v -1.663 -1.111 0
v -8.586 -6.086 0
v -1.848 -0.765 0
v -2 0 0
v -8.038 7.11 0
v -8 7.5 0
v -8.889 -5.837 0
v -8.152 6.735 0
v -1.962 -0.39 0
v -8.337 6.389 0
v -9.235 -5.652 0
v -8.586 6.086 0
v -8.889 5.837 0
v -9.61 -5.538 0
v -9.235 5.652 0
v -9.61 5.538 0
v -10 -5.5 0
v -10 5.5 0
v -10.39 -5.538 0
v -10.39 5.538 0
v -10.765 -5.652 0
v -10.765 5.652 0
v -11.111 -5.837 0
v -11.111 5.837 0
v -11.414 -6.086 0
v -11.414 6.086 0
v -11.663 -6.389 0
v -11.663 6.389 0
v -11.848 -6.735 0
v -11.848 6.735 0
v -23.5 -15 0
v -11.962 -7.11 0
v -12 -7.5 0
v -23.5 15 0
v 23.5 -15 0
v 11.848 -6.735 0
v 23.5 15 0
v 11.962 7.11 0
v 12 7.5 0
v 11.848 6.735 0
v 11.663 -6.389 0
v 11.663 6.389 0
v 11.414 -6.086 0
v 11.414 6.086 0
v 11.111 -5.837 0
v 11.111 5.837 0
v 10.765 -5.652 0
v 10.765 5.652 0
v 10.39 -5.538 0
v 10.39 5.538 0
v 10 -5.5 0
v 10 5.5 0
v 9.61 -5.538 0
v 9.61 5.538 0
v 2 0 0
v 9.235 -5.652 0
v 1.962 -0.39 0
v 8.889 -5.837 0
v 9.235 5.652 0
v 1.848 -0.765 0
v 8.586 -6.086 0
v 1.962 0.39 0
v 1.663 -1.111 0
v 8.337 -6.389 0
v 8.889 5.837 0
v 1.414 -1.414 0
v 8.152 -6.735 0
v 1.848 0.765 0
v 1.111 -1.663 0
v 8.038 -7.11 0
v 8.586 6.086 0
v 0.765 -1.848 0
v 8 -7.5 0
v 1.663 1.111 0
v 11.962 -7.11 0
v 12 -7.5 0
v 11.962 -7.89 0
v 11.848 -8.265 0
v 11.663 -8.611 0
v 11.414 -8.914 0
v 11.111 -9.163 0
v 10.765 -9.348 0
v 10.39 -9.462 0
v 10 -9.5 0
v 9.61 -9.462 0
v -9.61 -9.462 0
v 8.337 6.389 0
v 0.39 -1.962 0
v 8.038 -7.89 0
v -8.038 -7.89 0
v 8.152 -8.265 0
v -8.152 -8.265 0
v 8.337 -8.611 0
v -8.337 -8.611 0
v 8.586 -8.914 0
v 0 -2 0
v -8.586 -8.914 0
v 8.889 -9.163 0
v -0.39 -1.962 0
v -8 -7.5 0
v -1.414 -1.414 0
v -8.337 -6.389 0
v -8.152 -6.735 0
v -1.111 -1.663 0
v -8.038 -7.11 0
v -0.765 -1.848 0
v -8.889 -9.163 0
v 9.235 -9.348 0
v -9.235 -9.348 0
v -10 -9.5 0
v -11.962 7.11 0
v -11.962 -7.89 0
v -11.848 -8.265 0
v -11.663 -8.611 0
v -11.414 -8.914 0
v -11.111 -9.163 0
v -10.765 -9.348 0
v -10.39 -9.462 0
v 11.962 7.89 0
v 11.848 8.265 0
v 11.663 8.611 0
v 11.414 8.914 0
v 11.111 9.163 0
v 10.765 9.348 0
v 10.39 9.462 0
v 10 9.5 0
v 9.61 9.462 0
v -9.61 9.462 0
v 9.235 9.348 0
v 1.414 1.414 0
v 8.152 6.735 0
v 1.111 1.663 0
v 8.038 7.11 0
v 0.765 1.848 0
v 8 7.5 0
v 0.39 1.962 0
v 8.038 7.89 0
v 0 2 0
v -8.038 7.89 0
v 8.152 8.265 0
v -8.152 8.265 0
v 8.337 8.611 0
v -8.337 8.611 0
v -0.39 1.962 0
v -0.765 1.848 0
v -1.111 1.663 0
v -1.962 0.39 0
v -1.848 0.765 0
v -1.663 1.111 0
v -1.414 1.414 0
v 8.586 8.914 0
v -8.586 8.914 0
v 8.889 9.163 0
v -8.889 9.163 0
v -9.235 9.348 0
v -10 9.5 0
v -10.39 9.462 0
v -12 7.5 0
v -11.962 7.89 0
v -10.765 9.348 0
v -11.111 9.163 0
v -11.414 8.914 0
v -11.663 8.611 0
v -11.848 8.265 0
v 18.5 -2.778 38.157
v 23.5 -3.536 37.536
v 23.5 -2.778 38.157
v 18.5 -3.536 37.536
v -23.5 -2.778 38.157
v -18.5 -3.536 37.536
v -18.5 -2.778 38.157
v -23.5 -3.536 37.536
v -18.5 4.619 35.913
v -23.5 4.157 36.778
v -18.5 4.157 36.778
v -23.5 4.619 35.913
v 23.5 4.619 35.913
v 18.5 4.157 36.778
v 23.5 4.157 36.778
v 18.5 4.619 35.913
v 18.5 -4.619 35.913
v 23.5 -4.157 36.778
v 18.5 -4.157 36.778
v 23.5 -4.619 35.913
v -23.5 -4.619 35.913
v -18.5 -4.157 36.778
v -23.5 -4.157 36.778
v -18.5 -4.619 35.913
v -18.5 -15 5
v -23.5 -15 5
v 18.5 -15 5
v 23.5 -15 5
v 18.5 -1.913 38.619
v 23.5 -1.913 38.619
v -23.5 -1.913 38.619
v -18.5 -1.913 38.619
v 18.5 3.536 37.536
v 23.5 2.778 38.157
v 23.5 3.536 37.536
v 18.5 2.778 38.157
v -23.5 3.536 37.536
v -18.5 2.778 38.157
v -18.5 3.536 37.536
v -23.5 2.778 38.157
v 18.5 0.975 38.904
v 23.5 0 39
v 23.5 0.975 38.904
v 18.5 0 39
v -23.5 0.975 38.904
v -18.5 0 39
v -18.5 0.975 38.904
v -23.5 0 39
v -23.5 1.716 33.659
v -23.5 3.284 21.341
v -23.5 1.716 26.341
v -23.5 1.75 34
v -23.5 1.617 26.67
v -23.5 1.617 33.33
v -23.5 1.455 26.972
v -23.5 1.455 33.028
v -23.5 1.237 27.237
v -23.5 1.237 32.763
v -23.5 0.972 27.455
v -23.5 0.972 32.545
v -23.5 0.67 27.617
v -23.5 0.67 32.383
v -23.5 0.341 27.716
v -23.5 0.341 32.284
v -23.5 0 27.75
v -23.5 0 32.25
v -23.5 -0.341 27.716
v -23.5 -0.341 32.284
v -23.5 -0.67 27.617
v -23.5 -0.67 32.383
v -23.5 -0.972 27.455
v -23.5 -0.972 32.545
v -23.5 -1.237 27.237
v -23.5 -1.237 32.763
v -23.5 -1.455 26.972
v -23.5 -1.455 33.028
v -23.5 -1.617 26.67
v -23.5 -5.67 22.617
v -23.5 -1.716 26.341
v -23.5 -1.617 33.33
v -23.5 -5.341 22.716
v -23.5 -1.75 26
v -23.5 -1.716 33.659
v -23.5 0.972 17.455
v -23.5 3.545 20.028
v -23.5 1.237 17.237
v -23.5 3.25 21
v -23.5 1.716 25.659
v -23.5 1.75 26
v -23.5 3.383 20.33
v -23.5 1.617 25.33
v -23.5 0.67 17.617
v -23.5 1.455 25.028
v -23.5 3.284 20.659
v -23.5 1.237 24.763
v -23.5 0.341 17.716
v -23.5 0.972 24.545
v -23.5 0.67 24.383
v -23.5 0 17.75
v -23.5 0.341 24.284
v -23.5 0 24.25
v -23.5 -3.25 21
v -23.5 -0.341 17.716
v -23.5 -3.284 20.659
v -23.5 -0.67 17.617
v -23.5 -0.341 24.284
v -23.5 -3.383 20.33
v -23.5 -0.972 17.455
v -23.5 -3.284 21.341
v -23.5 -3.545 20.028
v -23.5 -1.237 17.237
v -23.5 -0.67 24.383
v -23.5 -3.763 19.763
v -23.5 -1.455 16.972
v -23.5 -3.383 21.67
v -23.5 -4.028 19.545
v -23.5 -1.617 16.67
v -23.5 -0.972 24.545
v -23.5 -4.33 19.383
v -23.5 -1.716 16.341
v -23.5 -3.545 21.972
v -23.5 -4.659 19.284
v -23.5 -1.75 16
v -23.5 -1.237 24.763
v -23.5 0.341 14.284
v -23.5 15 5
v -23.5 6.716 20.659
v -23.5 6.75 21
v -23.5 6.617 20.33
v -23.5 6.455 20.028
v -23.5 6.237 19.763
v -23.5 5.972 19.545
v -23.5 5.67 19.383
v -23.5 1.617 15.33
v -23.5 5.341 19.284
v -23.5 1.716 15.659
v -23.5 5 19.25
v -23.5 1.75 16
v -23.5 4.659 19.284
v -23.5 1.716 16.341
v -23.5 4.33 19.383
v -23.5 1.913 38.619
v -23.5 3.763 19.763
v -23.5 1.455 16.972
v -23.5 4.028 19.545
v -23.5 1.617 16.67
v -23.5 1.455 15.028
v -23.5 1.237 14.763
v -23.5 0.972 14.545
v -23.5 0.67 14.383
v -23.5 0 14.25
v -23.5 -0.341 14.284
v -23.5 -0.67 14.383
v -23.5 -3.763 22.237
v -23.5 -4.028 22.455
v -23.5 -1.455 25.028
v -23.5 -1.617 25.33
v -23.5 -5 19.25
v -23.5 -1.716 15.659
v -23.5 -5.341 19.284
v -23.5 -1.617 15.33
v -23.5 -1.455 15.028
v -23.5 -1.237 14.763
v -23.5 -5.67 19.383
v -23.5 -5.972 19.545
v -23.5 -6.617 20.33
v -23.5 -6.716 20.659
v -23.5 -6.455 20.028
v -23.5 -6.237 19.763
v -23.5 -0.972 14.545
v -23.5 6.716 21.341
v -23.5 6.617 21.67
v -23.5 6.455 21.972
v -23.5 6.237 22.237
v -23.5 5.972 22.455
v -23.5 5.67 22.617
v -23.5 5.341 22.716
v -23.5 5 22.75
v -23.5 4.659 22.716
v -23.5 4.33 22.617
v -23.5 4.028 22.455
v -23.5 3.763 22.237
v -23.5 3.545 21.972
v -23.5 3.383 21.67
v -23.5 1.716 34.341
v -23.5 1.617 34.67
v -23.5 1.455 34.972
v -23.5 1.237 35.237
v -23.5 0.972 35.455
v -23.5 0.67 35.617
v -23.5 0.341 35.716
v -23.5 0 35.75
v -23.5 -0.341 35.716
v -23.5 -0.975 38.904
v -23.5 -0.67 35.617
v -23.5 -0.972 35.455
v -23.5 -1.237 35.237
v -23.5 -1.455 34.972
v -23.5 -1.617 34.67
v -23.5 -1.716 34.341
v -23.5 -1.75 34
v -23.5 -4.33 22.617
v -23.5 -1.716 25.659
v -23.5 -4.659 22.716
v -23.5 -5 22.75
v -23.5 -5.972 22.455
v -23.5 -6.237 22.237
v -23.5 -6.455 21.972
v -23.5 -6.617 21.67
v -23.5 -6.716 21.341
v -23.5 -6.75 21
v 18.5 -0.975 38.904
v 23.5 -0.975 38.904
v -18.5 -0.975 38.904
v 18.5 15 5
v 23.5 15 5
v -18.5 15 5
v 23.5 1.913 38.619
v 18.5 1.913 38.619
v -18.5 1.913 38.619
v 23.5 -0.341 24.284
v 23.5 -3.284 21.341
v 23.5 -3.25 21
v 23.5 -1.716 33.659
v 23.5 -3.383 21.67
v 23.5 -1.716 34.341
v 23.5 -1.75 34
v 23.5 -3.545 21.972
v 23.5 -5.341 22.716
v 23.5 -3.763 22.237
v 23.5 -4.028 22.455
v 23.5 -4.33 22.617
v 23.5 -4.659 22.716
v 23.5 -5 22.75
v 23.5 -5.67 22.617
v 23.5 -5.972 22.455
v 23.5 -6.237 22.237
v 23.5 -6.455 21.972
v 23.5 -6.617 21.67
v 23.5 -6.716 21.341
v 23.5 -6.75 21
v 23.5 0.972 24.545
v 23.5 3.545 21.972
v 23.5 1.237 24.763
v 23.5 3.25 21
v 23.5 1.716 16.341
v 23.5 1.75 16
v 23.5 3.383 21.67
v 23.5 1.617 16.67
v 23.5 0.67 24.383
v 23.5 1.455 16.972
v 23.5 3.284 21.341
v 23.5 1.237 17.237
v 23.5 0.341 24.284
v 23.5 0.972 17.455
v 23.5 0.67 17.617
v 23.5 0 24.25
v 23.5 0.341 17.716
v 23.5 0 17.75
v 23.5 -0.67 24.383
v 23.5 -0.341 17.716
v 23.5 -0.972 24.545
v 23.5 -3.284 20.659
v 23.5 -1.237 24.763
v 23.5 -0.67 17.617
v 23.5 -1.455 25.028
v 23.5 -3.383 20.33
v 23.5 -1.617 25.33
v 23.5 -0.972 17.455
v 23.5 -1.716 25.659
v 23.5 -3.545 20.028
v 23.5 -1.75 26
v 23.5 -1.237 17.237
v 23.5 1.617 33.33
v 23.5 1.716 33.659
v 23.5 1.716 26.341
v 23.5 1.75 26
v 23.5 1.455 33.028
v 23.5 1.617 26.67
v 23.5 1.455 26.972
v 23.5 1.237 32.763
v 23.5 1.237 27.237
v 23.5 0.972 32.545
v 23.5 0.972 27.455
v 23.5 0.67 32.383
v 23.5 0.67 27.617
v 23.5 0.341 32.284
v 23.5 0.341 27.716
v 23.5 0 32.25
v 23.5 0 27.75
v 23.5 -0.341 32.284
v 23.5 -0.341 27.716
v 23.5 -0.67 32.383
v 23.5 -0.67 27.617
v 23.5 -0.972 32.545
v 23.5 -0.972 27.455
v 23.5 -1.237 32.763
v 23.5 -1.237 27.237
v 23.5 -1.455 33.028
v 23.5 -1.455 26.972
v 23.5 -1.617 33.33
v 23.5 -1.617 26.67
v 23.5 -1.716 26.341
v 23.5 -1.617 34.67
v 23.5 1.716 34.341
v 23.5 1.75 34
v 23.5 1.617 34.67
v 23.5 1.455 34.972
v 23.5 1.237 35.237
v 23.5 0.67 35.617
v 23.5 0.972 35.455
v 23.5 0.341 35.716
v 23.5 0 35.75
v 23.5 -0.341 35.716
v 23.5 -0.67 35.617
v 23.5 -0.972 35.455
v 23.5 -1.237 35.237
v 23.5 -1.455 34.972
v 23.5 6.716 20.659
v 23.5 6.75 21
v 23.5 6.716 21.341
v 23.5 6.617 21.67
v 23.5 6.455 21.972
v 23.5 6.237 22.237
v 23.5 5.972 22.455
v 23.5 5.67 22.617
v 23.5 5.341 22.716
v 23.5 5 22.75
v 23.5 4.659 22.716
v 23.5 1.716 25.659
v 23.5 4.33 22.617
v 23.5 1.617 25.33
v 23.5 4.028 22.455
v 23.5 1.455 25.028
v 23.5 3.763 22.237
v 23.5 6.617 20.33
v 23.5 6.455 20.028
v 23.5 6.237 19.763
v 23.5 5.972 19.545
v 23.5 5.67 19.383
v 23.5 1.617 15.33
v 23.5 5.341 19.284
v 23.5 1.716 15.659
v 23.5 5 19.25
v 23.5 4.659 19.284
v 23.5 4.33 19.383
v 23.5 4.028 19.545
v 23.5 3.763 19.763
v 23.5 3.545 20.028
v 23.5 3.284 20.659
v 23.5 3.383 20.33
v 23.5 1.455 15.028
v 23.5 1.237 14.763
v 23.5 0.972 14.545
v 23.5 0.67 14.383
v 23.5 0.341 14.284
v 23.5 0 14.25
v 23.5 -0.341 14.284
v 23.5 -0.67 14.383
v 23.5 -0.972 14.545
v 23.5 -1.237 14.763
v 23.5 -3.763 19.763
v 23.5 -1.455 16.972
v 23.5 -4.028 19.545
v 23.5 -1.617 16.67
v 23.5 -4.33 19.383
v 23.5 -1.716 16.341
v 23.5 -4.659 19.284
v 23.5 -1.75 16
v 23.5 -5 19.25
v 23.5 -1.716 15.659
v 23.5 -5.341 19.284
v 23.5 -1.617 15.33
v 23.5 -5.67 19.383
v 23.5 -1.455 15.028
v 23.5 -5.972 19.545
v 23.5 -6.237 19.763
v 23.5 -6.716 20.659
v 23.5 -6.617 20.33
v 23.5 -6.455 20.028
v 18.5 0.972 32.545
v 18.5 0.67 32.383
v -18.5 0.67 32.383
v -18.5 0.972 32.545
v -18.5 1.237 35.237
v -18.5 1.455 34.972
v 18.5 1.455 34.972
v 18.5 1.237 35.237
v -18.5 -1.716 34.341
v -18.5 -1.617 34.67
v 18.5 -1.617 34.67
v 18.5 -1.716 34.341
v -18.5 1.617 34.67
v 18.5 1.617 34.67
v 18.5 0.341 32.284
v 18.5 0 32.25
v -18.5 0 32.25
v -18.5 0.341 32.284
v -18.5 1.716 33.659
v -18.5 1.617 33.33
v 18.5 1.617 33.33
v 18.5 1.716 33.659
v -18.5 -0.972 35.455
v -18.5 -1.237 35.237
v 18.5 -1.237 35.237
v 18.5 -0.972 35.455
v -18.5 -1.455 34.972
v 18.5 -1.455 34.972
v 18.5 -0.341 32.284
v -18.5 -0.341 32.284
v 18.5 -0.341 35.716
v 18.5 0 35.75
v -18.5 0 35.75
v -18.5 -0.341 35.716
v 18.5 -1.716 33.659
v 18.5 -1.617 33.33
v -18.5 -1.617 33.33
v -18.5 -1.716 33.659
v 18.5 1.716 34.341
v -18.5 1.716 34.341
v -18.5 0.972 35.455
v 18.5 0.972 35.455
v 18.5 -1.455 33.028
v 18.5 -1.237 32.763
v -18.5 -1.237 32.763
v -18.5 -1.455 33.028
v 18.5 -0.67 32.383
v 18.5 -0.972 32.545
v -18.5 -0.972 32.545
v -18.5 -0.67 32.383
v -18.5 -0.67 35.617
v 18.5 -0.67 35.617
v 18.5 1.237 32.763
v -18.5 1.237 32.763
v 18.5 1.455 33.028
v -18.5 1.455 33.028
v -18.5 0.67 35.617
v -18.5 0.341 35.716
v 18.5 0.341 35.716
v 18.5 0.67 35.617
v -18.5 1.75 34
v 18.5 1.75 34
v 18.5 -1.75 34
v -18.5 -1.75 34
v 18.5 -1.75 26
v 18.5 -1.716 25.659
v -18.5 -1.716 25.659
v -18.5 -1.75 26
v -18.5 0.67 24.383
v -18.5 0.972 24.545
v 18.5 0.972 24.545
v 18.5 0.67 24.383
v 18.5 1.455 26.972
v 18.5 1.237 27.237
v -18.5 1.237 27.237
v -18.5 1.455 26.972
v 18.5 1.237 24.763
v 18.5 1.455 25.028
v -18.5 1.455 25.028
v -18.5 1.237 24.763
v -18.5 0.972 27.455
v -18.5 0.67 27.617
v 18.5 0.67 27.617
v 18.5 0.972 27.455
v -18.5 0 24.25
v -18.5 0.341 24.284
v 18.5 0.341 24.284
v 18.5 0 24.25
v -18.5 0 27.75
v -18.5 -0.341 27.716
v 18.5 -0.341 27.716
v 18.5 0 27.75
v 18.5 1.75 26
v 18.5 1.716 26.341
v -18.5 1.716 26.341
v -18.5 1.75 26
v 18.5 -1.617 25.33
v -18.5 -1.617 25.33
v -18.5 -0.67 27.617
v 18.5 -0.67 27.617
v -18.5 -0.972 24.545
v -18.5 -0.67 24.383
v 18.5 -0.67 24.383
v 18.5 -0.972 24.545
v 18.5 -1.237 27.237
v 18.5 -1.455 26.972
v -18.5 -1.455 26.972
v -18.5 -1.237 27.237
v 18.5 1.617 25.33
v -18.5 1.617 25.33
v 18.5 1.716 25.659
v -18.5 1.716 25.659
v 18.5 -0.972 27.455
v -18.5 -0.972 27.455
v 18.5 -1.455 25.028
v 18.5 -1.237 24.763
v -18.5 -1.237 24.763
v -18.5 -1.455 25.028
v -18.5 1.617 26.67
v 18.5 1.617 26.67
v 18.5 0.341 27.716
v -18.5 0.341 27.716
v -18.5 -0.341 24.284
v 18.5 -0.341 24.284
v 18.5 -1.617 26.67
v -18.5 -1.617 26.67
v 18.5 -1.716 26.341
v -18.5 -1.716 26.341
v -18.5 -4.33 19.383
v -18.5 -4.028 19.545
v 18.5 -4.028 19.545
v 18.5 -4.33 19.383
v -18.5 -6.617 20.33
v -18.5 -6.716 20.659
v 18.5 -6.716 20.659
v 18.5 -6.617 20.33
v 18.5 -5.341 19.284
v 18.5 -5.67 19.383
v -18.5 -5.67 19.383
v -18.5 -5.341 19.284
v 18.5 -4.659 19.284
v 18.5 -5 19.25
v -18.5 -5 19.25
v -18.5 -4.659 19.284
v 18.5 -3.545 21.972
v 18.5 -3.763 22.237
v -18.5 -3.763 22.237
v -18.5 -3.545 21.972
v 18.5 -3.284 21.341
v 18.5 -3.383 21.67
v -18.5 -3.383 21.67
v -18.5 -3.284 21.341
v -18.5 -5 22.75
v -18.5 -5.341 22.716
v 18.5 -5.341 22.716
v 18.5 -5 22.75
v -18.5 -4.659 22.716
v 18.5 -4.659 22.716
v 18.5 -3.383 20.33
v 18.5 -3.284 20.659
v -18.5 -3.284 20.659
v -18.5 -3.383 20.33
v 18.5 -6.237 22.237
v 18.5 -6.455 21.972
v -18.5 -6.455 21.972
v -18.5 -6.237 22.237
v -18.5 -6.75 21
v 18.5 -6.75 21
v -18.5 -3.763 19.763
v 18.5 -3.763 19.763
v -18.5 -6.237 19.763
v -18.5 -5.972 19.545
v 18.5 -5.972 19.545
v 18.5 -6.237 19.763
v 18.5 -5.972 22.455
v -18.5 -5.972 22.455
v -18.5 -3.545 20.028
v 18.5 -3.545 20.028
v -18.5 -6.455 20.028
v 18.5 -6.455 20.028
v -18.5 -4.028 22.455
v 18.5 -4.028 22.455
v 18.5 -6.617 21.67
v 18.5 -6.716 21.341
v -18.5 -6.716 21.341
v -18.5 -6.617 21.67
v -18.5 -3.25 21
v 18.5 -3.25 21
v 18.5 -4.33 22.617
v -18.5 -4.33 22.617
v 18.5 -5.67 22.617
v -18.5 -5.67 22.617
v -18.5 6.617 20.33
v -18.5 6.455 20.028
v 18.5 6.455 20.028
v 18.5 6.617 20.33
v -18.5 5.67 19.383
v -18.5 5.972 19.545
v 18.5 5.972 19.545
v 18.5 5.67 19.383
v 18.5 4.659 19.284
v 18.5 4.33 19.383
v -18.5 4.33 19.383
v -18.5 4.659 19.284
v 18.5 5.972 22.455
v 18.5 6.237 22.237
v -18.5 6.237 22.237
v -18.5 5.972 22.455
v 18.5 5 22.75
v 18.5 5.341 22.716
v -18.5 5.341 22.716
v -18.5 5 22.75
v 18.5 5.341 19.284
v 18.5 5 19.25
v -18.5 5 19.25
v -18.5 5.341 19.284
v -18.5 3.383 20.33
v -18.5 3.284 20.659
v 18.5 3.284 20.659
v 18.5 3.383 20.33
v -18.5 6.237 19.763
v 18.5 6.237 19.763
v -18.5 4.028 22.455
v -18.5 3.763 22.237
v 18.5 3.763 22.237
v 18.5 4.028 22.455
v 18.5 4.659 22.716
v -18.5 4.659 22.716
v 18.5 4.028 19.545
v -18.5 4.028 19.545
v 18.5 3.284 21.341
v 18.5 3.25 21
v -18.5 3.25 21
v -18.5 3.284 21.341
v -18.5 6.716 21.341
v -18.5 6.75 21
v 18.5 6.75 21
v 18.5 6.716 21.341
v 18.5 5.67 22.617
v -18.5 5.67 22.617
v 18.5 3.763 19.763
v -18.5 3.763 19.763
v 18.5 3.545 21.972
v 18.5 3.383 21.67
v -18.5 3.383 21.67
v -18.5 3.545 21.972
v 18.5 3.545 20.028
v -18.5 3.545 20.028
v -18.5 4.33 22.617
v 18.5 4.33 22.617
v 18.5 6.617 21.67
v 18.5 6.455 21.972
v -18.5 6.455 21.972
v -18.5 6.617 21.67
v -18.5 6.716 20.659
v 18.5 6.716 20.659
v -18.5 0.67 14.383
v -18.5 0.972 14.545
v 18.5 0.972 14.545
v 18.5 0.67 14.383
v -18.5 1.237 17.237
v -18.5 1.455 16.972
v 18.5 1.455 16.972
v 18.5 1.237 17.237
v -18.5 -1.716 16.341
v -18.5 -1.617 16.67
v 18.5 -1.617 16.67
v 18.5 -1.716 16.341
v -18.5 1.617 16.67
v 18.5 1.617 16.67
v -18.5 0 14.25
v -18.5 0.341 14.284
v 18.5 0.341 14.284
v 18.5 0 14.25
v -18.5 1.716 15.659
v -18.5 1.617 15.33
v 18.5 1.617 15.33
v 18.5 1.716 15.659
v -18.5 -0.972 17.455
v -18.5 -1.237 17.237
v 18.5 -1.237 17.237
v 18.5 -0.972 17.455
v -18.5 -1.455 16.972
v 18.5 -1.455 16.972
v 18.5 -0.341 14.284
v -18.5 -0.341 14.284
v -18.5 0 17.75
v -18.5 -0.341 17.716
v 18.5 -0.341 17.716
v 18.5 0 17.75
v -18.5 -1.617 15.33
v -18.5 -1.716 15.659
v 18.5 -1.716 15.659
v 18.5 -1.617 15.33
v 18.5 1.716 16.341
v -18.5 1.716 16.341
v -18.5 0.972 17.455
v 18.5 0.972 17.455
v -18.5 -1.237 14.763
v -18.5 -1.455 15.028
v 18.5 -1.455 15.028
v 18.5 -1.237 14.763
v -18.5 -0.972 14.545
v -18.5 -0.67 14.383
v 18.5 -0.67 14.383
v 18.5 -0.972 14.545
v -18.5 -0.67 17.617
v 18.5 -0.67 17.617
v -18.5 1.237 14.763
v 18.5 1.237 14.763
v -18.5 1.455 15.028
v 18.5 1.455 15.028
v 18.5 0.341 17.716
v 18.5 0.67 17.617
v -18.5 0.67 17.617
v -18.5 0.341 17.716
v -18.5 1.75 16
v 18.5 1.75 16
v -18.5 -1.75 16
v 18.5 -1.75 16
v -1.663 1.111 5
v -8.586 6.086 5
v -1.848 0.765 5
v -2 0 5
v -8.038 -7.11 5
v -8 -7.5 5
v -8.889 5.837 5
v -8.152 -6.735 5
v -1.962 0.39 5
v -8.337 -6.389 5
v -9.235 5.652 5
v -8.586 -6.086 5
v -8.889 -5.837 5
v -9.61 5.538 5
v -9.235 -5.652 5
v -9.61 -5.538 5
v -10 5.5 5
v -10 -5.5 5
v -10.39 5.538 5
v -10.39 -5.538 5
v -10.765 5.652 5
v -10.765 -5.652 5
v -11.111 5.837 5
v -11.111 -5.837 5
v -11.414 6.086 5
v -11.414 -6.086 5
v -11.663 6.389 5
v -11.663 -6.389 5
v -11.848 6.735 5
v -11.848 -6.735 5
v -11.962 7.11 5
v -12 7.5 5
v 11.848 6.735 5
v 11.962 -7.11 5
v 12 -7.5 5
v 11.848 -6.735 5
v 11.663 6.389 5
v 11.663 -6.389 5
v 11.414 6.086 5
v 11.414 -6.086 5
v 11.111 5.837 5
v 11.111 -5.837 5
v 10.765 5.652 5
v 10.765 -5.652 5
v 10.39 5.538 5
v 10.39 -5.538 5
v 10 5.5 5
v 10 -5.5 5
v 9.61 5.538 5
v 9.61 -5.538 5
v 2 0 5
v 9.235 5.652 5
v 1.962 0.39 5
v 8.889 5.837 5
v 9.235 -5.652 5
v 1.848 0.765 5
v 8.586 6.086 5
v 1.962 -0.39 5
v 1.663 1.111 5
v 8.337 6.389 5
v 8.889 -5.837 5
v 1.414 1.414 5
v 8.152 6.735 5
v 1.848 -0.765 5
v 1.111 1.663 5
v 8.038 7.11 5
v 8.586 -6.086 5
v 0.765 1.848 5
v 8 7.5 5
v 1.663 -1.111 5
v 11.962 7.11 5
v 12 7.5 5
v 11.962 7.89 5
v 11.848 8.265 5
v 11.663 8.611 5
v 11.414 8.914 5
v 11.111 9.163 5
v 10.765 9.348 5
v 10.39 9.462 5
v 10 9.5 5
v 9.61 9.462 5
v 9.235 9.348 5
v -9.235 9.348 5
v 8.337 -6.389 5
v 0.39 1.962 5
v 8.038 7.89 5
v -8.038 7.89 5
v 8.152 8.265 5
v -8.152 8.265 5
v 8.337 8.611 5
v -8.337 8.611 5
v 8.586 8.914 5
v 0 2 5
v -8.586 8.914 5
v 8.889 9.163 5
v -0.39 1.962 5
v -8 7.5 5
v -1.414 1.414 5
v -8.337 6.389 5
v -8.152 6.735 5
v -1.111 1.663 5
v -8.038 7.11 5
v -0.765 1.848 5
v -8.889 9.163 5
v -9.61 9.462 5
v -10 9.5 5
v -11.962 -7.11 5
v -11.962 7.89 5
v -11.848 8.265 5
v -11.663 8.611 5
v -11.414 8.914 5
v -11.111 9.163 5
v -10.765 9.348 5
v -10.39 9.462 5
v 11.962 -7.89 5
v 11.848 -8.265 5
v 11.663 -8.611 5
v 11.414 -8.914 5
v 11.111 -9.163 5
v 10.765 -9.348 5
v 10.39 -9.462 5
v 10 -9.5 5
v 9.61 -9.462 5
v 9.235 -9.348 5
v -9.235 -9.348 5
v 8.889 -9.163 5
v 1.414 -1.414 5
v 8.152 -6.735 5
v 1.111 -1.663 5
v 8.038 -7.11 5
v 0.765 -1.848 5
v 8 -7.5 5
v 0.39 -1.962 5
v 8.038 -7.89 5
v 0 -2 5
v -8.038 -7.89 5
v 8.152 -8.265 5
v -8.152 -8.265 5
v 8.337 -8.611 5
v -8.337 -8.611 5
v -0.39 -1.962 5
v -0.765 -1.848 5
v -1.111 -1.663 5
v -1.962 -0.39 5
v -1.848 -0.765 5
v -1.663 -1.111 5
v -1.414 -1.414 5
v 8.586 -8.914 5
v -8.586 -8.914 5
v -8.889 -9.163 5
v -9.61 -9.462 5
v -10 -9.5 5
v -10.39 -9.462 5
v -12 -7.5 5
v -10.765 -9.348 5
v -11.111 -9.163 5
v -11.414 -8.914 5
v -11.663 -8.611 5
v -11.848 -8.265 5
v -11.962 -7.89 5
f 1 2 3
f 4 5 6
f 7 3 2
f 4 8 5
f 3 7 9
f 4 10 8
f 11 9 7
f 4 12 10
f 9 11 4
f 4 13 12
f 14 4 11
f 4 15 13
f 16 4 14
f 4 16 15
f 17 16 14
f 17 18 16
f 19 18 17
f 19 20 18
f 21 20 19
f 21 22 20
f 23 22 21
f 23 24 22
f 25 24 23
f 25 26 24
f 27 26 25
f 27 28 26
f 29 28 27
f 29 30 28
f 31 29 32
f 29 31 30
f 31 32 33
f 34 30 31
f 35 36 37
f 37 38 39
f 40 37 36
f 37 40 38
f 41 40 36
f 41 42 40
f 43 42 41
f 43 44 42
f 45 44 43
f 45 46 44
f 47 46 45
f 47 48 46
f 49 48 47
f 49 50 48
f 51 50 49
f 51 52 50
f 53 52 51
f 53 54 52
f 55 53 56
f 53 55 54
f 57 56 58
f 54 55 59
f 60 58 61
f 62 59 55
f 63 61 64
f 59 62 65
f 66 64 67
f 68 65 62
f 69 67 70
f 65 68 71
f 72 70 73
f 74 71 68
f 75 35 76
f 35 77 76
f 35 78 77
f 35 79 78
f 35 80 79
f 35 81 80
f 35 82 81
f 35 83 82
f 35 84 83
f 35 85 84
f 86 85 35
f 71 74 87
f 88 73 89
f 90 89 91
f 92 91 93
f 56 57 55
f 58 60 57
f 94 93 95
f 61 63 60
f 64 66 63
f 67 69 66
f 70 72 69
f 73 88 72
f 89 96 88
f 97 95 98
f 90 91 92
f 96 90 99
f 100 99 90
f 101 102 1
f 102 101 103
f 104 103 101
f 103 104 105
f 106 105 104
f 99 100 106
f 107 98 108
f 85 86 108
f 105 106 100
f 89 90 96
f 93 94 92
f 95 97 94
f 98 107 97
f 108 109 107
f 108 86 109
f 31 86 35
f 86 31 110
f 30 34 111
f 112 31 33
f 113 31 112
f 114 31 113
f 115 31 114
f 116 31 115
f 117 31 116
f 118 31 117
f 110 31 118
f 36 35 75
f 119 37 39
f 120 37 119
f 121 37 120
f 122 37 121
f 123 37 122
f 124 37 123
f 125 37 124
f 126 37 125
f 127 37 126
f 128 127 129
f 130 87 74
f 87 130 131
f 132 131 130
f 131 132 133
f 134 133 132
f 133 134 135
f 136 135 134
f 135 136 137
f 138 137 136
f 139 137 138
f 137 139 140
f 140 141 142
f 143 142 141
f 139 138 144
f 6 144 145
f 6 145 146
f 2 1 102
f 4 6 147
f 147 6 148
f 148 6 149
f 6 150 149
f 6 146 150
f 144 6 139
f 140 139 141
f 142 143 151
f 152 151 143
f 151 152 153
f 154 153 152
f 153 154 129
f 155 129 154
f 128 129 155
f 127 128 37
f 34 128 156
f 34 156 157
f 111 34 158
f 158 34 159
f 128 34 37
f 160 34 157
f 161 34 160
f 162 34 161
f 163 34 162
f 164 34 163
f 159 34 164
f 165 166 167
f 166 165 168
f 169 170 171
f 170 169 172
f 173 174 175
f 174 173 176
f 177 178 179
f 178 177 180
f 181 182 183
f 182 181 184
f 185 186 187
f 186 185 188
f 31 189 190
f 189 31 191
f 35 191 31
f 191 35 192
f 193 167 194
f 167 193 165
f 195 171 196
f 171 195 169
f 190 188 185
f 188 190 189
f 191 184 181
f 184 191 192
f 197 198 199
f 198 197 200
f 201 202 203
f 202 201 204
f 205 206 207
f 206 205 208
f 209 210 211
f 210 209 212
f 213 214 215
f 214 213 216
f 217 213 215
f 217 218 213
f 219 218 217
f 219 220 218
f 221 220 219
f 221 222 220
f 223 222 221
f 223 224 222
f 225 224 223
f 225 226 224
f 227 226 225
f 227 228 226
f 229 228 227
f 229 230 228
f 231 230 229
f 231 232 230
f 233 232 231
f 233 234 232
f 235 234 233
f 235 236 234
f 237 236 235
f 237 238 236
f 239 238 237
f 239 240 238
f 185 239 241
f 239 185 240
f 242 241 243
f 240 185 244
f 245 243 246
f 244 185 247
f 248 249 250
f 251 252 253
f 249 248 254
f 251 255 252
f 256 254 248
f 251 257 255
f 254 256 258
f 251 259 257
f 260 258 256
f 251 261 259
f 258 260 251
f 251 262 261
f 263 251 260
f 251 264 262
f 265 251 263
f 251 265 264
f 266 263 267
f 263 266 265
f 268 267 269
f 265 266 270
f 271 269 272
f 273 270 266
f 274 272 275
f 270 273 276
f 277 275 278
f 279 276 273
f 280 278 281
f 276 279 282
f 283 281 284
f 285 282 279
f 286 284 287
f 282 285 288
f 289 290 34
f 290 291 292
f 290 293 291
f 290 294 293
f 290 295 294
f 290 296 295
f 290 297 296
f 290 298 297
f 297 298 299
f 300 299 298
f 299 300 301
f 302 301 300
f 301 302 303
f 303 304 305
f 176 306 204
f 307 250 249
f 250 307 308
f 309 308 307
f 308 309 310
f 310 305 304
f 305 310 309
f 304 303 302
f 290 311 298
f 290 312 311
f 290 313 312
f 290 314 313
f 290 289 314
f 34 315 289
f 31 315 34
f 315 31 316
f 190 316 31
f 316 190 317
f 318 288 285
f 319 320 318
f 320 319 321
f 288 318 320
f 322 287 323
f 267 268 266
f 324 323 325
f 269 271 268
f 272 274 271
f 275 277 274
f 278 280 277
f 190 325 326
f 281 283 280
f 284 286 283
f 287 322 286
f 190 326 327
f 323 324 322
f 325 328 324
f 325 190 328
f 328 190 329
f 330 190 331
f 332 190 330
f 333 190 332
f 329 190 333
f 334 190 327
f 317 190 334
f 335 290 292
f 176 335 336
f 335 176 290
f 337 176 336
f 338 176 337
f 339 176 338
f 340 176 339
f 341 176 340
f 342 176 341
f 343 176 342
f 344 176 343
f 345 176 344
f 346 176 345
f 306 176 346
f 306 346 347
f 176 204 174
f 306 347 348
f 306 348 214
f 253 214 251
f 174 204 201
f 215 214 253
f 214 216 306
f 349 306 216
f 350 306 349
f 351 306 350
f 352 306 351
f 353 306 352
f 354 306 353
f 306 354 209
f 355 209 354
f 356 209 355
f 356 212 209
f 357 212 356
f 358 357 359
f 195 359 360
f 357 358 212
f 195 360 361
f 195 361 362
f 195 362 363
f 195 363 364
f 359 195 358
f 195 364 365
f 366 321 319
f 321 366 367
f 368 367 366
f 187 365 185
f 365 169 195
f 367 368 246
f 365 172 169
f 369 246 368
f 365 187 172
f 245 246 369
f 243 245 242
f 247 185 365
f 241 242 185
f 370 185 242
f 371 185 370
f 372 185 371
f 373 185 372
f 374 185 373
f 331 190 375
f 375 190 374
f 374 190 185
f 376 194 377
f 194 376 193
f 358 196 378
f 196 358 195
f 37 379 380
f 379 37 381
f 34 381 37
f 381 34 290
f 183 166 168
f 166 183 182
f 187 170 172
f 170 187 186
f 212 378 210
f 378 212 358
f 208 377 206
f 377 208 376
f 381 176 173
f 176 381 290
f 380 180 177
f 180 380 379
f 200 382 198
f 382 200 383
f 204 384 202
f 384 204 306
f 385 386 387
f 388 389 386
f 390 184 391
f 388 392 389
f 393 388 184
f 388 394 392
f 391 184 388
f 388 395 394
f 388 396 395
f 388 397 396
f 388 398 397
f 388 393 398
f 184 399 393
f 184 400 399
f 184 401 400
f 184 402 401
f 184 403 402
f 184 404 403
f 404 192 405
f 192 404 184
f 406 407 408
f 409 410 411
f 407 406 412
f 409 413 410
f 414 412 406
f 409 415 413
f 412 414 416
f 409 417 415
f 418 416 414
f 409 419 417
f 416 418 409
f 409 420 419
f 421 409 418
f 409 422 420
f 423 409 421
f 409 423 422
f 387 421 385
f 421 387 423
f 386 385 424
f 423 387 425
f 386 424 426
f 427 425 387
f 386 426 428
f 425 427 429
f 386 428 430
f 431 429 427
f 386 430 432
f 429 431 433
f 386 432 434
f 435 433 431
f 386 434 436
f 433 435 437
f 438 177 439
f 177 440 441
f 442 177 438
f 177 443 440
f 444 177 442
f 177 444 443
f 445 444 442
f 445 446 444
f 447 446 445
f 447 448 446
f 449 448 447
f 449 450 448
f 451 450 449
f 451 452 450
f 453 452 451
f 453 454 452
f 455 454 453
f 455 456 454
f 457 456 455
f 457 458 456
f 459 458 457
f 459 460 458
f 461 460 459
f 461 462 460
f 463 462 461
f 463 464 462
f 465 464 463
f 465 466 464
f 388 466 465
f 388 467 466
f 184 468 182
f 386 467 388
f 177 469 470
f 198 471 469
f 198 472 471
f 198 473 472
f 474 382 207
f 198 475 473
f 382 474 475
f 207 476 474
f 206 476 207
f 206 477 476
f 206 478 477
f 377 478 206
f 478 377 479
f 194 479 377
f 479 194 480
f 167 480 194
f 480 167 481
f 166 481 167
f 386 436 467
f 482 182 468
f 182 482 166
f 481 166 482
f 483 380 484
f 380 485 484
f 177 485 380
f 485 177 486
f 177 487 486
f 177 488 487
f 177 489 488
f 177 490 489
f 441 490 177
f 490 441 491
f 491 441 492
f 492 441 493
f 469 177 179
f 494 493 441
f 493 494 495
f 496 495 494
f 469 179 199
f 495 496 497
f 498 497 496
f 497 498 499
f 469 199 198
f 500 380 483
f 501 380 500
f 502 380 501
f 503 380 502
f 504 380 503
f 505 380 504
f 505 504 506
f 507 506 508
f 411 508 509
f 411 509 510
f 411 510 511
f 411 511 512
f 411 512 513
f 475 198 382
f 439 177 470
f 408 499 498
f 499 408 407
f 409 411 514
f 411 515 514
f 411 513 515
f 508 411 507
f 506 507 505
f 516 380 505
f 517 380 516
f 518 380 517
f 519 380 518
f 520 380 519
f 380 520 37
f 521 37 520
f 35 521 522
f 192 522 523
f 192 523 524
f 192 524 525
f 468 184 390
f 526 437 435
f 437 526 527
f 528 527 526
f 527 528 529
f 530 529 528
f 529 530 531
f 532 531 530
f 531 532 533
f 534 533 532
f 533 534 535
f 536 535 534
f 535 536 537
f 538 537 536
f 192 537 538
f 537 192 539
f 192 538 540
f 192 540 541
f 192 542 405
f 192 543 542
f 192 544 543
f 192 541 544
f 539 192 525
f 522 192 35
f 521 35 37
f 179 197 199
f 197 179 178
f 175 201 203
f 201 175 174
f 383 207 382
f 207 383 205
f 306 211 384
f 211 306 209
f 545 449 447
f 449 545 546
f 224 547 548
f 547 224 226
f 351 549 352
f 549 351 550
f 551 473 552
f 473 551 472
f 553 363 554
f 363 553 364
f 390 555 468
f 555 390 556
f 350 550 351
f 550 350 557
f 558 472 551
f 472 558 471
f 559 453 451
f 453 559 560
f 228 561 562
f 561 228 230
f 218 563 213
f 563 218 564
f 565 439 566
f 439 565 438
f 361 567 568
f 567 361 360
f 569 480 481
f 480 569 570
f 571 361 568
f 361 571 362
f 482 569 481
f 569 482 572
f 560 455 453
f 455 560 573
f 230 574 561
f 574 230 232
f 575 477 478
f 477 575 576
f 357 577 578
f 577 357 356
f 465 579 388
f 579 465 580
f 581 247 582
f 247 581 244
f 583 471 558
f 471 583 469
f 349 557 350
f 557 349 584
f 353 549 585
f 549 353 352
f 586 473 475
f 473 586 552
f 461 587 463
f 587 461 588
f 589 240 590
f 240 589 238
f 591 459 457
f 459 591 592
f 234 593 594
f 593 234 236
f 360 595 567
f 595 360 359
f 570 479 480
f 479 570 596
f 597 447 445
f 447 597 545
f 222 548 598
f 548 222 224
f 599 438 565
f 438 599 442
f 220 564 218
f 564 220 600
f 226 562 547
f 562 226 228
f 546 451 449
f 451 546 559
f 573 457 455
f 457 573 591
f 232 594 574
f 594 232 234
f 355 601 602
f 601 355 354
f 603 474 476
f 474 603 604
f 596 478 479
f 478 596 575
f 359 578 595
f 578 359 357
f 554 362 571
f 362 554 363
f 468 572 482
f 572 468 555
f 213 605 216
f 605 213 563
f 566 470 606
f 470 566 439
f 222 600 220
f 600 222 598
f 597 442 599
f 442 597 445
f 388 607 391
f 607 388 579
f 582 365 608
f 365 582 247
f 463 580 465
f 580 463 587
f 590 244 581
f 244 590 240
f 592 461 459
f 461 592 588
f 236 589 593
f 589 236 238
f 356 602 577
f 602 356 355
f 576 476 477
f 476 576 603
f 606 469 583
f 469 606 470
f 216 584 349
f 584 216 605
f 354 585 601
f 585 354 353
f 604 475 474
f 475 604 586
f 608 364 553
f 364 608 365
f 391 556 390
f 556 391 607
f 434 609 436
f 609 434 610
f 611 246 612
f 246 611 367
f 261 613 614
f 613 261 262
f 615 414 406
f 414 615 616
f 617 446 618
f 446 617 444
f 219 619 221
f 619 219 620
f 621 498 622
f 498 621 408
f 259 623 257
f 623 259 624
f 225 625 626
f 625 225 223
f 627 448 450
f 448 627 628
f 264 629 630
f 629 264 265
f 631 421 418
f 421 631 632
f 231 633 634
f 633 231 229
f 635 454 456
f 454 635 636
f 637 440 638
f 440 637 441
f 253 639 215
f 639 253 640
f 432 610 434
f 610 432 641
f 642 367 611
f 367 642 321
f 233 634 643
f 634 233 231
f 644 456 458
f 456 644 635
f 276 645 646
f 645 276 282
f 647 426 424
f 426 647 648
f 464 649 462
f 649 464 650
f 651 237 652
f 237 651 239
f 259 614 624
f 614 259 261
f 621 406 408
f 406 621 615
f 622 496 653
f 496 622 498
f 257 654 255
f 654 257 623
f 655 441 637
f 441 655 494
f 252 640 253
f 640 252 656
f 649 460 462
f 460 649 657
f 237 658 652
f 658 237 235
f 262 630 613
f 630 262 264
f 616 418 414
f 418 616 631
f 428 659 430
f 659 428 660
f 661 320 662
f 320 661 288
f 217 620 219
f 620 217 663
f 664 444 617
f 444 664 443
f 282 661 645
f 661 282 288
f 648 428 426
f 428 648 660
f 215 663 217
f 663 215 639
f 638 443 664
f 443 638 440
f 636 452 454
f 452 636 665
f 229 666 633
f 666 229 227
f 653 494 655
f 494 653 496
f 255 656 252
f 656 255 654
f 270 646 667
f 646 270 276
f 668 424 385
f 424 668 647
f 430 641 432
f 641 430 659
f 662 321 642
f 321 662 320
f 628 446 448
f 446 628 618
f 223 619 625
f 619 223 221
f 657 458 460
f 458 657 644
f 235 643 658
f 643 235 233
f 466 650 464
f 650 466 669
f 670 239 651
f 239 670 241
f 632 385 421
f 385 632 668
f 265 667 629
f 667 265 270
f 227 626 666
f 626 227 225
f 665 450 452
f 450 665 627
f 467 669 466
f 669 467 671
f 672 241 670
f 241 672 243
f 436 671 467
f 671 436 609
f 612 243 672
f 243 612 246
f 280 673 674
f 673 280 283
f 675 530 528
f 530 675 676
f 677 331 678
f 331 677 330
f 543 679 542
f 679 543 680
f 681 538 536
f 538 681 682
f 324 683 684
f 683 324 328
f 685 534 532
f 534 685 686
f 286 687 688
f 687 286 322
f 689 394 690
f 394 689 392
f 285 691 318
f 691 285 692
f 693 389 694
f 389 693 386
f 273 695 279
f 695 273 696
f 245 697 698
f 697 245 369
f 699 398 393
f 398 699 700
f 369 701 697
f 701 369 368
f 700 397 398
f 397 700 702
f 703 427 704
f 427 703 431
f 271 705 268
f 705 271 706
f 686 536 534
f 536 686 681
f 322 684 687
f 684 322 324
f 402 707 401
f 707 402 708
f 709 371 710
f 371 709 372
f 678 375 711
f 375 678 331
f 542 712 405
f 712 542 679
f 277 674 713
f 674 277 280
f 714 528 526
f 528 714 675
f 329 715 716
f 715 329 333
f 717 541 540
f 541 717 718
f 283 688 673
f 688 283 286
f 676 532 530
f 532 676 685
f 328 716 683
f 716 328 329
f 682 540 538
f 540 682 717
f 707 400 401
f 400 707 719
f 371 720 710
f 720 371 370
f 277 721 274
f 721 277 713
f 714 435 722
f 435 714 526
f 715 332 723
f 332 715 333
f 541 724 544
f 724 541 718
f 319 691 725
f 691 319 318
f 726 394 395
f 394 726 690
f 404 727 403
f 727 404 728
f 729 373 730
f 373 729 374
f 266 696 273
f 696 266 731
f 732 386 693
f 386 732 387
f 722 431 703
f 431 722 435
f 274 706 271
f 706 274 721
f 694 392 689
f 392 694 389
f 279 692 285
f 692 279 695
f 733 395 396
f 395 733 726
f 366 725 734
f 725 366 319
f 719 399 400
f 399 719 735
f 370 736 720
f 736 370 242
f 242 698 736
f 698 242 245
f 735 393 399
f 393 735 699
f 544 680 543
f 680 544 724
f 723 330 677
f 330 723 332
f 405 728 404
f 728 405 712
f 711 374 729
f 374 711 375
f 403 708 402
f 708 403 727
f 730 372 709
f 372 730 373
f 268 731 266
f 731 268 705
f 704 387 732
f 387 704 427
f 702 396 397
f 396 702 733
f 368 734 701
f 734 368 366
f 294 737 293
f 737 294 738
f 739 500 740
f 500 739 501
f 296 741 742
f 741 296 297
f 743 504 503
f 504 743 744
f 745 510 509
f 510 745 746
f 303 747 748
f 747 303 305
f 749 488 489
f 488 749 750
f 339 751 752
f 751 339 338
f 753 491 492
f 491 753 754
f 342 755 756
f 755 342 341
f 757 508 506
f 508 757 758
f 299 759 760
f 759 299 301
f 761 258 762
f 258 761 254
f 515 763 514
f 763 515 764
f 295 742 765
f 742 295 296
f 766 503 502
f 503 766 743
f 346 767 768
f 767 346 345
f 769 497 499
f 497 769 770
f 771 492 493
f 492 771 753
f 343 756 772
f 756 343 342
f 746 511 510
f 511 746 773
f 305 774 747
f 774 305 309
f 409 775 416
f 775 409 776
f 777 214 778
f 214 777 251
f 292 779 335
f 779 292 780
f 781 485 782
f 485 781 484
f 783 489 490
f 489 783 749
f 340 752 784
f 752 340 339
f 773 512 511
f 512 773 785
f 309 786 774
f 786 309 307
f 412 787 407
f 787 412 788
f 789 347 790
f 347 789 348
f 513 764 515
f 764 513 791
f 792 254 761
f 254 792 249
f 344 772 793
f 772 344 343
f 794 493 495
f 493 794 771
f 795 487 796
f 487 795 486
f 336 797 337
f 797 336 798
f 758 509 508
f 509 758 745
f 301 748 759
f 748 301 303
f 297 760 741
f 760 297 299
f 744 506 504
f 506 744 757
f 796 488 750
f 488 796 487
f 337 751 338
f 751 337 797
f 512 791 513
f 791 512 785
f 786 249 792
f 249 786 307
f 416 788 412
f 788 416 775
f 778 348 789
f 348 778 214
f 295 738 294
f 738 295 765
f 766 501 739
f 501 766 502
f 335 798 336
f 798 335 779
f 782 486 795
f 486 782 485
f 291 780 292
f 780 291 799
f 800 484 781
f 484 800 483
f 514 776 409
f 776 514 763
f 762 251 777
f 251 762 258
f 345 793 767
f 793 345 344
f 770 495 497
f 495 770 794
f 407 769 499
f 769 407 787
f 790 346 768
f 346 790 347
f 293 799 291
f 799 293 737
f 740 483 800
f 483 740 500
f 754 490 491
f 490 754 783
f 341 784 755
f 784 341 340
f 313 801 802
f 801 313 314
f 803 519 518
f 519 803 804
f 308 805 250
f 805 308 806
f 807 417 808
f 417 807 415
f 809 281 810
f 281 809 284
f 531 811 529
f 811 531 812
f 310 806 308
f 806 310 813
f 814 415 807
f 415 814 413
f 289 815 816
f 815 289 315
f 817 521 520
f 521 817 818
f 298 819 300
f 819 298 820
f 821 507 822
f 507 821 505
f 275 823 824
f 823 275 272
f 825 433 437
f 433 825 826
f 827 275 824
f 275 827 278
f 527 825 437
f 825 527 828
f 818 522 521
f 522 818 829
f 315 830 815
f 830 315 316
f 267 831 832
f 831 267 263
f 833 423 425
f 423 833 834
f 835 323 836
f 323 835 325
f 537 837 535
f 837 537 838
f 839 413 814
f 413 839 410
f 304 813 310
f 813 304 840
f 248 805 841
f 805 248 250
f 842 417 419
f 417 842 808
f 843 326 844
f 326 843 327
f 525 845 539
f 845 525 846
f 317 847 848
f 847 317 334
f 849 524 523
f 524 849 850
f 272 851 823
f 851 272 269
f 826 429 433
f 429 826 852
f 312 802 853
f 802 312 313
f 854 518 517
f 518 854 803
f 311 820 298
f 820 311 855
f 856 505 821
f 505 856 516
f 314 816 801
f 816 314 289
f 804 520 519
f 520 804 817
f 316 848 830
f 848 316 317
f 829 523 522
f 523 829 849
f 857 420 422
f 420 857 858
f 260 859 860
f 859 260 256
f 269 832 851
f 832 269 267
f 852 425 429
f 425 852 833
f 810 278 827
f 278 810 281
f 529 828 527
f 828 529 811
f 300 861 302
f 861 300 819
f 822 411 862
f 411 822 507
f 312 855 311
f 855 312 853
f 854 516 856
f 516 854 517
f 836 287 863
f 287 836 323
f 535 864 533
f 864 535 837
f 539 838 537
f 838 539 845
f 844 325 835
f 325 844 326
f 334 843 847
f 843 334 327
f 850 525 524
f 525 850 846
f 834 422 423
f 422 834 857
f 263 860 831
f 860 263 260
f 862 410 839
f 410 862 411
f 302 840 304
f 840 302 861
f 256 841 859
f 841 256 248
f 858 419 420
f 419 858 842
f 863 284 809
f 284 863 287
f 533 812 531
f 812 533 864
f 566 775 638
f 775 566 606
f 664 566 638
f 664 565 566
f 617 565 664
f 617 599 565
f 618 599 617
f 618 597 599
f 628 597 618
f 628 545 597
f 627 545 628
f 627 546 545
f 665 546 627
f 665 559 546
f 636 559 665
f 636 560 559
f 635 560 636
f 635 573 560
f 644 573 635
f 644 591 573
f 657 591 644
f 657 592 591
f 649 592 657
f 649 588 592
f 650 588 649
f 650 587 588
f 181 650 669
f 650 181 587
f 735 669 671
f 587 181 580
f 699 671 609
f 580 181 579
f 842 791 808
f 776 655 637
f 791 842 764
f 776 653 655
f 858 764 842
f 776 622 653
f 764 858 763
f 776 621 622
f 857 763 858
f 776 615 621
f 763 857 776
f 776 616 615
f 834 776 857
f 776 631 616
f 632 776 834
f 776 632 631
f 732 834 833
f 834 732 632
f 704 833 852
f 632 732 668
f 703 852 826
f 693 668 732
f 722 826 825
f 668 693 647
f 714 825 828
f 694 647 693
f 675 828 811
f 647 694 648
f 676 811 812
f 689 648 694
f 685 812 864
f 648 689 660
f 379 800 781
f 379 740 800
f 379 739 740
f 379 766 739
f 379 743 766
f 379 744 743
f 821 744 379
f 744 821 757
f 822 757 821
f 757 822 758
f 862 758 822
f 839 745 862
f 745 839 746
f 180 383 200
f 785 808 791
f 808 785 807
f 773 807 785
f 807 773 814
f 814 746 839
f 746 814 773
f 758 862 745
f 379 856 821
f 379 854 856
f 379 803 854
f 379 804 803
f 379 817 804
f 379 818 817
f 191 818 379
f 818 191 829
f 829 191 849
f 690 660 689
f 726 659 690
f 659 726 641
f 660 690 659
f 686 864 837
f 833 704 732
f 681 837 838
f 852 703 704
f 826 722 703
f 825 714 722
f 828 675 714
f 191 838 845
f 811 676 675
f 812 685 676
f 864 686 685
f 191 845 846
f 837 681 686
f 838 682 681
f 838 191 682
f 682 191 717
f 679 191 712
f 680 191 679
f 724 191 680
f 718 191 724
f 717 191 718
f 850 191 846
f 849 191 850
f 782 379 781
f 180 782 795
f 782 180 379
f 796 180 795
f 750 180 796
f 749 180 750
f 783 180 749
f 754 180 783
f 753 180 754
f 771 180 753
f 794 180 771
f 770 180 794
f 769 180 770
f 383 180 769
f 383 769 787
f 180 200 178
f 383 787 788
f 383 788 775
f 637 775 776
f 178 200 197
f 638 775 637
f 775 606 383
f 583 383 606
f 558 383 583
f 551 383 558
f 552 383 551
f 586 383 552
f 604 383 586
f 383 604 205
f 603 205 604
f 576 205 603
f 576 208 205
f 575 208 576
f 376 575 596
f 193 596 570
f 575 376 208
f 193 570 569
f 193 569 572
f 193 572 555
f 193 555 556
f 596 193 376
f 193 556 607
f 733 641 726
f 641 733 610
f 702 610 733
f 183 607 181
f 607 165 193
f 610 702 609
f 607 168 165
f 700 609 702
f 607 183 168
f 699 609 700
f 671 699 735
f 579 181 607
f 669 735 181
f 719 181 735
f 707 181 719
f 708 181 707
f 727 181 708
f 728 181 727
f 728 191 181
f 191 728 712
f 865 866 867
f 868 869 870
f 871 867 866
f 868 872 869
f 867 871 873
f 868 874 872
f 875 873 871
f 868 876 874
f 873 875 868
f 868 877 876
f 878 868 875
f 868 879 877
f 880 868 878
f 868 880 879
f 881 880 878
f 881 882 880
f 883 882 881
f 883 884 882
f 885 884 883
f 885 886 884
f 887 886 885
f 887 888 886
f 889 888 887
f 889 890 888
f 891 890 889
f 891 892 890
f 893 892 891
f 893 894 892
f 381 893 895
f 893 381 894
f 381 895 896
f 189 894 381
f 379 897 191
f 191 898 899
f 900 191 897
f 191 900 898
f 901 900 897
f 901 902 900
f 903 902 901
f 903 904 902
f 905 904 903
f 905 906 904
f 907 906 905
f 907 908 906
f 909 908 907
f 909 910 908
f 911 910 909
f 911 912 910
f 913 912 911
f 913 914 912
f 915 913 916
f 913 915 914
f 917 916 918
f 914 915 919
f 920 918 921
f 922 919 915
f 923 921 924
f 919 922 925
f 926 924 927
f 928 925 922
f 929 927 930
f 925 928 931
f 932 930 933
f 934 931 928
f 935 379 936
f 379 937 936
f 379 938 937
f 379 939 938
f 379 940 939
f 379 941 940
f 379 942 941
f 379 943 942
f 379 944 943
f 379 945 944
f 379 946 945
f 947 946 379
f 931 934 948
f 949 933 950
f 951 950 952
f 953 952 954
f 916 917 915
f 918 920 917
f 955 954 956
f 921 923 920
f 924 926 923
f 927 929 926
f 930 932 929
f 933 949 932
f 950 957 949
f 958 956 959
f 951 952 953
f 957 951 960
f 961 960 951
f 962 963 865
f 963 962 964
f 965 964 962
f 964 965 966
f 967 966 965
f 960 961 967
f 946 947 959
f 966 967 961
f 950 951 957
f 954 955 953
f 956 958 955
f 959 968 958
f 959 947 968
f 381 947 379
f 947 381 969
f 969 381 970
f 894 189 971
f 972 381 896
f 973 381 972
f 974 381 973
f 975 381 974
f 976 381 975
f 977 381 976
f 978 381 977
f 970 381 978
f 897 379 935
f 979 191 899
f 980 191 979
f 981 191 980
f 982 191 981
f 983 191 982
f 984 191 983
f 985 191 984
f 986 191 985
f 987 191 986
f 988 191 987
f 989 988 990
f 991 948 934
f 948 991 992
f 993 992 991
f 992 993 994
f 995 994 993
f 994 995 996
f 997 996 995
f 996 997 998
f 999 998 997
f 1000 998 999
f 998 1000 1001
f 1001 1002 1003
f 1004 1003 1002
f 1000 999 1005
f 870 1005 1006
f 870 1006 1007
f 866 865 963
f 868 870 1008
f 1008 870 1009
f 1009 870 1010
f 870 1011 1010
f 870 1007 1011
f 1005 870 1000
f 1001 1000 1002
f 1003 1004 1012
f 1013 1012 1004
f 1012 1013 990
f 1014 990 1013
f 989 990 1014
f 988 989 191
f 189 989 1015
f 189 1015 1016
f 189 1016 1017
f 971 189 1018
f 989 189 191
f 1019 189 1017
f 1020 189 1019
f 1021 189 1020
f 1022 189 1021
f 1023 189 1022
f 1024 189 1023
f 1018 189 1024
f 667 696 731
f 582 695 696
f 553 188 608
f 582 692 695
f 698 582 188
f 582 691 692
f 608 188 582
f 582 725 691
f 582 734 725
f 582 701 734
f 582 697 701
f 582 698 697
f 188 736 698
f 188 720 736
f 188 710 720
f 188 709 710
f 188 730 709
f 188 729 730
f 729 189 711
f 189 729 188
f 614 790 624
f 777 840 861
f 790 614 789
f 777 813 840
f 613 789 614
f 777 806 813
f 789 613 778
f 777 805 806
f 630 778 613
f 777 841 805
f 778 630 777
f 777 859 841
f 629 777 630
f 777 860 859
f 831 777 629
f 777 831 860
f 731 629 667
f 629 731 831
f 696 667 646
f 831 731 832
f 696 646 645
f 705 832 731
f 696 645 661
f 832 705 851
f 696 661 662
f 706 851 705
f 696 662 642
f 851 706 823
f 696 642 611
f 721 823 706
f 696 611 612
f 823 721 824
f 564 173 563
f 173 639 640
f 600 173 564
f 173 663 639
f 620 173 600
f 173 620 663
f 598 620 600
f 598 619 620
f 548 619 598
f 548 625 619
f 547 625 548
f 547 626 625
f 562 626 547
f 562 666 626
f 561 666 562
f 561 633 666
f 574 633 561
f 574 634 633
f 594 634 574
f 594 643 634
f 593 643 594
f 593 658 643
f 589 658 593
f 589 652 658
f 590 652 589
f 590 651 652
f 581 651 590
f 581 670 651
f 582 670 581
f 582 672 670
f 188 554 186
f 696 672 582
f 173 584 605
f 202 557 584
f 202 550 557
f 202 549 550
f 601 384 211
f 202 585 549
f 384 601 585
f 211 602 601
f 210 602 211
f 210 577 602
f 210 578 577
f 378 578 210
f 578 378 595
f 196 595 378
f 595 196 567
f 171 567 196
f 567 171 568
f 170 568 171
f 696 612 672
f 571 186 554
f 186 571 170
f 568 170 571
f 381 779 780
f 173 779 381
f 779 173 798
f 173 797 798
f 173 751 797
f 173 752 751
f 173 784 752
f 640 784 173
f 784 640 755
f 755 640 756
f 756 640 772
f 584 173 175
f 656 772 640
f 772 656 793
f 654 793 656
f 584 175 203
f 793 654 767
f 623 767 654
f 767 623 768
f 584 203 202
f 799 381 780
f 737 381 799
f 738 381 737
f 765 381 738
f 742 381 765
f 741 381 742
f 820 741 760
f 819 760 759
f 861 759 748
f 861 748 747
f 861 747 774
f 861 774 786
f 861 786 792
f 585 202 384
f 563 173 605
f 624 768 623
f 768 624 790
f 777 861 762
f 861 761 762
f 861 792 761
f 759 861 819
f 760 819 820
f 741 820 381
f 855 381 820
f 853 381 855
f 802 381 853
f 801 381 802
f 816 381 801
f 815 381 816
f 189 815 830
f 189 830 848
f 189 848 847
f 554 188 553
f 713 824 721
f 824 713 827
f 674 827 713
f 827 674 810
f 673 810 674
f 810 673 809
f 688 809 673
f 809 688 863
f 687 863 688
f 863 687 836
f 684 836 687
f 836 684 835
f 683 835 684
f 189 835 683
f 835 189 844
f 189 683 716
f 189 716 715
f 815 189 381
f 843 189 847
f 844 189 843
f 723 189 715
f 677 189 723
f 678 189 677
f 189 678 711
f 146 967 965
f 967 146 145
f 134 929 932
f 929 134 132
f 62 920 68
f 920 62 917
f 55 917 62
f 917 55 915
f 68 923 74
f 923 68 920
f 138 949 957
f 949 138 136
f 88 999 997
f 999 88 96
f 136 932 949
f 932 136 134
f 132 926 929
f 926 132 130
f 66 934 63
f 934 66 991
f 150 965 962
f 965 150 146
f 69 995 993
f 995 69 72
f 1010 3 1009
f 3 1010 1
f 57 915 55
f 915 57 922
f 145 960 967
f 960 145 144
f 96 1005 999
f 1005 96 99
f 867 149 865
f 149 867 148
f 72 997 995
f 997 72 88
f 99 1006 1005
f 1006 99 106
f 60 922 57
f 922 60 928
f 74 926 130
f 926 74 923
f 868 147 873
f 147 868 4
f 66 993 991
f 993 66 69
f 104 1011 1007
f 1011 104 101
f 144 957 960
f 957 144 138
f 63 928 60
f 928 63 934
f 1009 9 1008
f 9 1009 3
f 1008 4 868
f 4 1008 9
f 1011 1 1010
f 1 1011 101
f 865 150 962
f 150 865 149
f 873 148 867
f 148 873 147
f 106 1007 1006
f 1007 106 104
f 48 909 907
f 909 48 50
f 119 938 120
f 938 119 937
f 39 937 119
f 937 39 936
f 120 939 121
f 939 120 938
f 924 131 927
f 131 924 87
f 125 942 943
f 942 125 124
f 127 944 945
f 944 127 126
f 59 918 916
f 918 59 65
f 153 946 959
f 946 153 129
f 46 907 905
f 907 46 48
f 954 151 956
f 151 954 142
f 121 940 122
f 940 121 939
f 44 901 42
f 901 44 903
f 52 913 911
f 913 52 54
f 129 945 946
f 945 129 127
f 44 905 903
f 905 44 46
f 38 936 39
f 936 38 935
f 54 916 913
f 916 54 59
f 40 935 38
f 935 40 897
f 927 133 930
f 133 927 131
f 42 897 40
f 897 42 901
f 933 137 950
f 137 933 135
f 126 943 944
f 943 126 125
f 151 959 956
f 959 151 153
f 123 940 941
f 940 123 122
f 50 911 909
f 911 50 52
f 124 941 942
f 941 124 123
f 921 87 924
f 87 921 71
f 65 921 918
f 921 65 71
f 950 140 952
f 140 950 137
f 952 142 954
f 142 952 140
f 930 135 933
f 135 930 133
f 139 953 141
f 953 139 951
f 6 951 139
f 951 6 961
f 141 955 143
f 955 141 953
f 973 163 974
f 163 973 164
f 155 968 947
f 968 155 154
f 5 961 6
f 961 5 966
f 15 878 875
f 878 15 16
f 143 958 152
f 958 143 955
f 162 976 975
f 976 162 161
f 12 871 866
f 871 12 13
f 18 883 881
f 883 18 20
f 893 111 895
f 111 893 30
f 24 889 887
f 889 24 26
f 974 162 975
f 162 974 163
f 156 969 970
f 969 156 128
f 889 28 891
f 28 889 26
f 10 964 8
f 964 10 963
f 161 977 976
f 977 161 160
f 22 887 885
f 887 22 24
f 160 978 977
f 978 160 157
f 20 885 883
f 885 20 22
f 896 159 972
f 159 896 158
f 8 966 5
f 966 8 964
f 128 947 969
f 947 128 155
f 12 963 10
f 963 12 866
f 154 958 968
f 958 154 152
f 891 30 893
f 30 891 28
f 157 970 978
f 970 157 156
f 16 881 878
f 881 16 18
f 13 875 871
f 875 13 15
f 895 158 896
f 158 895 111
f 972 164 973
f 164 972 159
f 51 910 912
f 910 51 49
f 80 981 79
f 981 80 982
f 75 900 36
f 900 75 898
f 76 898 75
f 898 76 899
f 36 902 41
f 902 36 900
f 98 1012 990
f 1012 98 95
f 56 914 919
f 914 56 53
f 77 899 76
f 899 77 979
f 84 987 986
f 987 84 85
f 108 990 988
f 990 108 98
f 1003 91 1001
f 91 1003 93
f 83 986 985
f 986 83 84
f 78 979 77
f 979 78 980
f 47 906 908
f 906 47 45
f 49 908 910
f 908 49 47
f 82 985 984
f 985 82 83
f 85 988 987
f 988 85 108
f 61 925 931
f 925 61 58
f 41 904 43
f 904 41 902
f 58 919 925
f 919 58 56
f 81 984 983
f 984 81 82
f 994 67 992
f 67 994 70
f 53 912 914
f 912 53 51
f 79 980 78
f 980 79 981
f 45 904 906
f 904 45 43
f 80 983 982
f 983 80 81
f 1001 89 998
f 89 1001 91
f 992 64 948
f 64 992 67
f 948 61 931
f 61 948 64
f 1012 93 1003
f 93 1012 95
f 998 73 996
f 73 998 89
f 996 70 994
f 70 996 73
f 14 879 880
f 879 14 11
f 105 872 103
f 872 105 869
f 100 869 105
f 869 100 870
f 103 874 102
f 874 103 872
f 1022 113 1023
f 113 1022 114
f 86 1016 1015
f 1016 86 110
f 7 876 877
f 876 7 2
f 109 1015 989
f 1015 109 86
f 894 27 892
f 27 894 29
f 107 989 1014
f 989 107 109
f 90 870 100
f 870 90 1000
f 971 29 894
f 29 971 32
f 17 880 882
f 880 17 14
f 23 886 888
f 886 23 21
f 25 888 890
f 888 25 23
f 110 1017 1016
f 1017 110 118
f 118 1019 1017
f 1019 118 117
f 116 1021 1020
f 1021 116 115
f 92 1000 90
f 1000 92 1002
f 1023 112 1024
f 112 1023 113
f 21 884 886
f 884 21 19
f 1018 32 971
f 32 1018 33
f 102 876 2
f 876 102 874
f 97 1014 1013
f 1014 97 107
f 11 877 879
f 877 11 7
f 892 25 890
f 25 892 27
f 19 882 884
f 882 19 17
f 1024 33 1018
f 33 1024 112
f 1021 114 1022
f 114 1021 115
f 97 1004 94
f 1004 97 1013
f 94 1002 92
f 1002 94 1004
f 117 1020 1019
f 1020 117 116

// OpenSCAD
$fn=32;

difference() {
    hull() {
        translate([0,0,34]) rotate([0,90,0]) cylinder(h=47,d=10,center=true);
        translate([0,0,2.5]) cube([47,30,5],center=true);
    }
    translate([0,0,34]) rotate([0,90,0]) cylinder(h=47,d=3.5,center=true);
    translate([0,0,26]) rotate([0,90,0]) cylinder(h=47,d=3.5,center=true);
    translate([0,-5,21]) rotate([0,90,0]) cylinder(h=47,d=3.5,center=true);
    
    translate([0,5,21]) rotate([0,90,0]) cylinder(h=47,d=3.5,center=true);
    translate([0,0,16]) rotate([0,90,0]) cylinder(h=47,d=3.5,center=true);
    translate([0,0,30]) cube([37,30,50],center=true);
    cylinder(d=4,h=5);
    translate([10,7.5,0]) cylinder(d=4,h=5);
    translate([-10,7.5,0]) cylinder(d=4,h=5);
    translate([10,-7.5,0]) cylinder(d=4,h=5);
    translate([-10,-7.5,0]) cylinder(d=4,h=5);
}
